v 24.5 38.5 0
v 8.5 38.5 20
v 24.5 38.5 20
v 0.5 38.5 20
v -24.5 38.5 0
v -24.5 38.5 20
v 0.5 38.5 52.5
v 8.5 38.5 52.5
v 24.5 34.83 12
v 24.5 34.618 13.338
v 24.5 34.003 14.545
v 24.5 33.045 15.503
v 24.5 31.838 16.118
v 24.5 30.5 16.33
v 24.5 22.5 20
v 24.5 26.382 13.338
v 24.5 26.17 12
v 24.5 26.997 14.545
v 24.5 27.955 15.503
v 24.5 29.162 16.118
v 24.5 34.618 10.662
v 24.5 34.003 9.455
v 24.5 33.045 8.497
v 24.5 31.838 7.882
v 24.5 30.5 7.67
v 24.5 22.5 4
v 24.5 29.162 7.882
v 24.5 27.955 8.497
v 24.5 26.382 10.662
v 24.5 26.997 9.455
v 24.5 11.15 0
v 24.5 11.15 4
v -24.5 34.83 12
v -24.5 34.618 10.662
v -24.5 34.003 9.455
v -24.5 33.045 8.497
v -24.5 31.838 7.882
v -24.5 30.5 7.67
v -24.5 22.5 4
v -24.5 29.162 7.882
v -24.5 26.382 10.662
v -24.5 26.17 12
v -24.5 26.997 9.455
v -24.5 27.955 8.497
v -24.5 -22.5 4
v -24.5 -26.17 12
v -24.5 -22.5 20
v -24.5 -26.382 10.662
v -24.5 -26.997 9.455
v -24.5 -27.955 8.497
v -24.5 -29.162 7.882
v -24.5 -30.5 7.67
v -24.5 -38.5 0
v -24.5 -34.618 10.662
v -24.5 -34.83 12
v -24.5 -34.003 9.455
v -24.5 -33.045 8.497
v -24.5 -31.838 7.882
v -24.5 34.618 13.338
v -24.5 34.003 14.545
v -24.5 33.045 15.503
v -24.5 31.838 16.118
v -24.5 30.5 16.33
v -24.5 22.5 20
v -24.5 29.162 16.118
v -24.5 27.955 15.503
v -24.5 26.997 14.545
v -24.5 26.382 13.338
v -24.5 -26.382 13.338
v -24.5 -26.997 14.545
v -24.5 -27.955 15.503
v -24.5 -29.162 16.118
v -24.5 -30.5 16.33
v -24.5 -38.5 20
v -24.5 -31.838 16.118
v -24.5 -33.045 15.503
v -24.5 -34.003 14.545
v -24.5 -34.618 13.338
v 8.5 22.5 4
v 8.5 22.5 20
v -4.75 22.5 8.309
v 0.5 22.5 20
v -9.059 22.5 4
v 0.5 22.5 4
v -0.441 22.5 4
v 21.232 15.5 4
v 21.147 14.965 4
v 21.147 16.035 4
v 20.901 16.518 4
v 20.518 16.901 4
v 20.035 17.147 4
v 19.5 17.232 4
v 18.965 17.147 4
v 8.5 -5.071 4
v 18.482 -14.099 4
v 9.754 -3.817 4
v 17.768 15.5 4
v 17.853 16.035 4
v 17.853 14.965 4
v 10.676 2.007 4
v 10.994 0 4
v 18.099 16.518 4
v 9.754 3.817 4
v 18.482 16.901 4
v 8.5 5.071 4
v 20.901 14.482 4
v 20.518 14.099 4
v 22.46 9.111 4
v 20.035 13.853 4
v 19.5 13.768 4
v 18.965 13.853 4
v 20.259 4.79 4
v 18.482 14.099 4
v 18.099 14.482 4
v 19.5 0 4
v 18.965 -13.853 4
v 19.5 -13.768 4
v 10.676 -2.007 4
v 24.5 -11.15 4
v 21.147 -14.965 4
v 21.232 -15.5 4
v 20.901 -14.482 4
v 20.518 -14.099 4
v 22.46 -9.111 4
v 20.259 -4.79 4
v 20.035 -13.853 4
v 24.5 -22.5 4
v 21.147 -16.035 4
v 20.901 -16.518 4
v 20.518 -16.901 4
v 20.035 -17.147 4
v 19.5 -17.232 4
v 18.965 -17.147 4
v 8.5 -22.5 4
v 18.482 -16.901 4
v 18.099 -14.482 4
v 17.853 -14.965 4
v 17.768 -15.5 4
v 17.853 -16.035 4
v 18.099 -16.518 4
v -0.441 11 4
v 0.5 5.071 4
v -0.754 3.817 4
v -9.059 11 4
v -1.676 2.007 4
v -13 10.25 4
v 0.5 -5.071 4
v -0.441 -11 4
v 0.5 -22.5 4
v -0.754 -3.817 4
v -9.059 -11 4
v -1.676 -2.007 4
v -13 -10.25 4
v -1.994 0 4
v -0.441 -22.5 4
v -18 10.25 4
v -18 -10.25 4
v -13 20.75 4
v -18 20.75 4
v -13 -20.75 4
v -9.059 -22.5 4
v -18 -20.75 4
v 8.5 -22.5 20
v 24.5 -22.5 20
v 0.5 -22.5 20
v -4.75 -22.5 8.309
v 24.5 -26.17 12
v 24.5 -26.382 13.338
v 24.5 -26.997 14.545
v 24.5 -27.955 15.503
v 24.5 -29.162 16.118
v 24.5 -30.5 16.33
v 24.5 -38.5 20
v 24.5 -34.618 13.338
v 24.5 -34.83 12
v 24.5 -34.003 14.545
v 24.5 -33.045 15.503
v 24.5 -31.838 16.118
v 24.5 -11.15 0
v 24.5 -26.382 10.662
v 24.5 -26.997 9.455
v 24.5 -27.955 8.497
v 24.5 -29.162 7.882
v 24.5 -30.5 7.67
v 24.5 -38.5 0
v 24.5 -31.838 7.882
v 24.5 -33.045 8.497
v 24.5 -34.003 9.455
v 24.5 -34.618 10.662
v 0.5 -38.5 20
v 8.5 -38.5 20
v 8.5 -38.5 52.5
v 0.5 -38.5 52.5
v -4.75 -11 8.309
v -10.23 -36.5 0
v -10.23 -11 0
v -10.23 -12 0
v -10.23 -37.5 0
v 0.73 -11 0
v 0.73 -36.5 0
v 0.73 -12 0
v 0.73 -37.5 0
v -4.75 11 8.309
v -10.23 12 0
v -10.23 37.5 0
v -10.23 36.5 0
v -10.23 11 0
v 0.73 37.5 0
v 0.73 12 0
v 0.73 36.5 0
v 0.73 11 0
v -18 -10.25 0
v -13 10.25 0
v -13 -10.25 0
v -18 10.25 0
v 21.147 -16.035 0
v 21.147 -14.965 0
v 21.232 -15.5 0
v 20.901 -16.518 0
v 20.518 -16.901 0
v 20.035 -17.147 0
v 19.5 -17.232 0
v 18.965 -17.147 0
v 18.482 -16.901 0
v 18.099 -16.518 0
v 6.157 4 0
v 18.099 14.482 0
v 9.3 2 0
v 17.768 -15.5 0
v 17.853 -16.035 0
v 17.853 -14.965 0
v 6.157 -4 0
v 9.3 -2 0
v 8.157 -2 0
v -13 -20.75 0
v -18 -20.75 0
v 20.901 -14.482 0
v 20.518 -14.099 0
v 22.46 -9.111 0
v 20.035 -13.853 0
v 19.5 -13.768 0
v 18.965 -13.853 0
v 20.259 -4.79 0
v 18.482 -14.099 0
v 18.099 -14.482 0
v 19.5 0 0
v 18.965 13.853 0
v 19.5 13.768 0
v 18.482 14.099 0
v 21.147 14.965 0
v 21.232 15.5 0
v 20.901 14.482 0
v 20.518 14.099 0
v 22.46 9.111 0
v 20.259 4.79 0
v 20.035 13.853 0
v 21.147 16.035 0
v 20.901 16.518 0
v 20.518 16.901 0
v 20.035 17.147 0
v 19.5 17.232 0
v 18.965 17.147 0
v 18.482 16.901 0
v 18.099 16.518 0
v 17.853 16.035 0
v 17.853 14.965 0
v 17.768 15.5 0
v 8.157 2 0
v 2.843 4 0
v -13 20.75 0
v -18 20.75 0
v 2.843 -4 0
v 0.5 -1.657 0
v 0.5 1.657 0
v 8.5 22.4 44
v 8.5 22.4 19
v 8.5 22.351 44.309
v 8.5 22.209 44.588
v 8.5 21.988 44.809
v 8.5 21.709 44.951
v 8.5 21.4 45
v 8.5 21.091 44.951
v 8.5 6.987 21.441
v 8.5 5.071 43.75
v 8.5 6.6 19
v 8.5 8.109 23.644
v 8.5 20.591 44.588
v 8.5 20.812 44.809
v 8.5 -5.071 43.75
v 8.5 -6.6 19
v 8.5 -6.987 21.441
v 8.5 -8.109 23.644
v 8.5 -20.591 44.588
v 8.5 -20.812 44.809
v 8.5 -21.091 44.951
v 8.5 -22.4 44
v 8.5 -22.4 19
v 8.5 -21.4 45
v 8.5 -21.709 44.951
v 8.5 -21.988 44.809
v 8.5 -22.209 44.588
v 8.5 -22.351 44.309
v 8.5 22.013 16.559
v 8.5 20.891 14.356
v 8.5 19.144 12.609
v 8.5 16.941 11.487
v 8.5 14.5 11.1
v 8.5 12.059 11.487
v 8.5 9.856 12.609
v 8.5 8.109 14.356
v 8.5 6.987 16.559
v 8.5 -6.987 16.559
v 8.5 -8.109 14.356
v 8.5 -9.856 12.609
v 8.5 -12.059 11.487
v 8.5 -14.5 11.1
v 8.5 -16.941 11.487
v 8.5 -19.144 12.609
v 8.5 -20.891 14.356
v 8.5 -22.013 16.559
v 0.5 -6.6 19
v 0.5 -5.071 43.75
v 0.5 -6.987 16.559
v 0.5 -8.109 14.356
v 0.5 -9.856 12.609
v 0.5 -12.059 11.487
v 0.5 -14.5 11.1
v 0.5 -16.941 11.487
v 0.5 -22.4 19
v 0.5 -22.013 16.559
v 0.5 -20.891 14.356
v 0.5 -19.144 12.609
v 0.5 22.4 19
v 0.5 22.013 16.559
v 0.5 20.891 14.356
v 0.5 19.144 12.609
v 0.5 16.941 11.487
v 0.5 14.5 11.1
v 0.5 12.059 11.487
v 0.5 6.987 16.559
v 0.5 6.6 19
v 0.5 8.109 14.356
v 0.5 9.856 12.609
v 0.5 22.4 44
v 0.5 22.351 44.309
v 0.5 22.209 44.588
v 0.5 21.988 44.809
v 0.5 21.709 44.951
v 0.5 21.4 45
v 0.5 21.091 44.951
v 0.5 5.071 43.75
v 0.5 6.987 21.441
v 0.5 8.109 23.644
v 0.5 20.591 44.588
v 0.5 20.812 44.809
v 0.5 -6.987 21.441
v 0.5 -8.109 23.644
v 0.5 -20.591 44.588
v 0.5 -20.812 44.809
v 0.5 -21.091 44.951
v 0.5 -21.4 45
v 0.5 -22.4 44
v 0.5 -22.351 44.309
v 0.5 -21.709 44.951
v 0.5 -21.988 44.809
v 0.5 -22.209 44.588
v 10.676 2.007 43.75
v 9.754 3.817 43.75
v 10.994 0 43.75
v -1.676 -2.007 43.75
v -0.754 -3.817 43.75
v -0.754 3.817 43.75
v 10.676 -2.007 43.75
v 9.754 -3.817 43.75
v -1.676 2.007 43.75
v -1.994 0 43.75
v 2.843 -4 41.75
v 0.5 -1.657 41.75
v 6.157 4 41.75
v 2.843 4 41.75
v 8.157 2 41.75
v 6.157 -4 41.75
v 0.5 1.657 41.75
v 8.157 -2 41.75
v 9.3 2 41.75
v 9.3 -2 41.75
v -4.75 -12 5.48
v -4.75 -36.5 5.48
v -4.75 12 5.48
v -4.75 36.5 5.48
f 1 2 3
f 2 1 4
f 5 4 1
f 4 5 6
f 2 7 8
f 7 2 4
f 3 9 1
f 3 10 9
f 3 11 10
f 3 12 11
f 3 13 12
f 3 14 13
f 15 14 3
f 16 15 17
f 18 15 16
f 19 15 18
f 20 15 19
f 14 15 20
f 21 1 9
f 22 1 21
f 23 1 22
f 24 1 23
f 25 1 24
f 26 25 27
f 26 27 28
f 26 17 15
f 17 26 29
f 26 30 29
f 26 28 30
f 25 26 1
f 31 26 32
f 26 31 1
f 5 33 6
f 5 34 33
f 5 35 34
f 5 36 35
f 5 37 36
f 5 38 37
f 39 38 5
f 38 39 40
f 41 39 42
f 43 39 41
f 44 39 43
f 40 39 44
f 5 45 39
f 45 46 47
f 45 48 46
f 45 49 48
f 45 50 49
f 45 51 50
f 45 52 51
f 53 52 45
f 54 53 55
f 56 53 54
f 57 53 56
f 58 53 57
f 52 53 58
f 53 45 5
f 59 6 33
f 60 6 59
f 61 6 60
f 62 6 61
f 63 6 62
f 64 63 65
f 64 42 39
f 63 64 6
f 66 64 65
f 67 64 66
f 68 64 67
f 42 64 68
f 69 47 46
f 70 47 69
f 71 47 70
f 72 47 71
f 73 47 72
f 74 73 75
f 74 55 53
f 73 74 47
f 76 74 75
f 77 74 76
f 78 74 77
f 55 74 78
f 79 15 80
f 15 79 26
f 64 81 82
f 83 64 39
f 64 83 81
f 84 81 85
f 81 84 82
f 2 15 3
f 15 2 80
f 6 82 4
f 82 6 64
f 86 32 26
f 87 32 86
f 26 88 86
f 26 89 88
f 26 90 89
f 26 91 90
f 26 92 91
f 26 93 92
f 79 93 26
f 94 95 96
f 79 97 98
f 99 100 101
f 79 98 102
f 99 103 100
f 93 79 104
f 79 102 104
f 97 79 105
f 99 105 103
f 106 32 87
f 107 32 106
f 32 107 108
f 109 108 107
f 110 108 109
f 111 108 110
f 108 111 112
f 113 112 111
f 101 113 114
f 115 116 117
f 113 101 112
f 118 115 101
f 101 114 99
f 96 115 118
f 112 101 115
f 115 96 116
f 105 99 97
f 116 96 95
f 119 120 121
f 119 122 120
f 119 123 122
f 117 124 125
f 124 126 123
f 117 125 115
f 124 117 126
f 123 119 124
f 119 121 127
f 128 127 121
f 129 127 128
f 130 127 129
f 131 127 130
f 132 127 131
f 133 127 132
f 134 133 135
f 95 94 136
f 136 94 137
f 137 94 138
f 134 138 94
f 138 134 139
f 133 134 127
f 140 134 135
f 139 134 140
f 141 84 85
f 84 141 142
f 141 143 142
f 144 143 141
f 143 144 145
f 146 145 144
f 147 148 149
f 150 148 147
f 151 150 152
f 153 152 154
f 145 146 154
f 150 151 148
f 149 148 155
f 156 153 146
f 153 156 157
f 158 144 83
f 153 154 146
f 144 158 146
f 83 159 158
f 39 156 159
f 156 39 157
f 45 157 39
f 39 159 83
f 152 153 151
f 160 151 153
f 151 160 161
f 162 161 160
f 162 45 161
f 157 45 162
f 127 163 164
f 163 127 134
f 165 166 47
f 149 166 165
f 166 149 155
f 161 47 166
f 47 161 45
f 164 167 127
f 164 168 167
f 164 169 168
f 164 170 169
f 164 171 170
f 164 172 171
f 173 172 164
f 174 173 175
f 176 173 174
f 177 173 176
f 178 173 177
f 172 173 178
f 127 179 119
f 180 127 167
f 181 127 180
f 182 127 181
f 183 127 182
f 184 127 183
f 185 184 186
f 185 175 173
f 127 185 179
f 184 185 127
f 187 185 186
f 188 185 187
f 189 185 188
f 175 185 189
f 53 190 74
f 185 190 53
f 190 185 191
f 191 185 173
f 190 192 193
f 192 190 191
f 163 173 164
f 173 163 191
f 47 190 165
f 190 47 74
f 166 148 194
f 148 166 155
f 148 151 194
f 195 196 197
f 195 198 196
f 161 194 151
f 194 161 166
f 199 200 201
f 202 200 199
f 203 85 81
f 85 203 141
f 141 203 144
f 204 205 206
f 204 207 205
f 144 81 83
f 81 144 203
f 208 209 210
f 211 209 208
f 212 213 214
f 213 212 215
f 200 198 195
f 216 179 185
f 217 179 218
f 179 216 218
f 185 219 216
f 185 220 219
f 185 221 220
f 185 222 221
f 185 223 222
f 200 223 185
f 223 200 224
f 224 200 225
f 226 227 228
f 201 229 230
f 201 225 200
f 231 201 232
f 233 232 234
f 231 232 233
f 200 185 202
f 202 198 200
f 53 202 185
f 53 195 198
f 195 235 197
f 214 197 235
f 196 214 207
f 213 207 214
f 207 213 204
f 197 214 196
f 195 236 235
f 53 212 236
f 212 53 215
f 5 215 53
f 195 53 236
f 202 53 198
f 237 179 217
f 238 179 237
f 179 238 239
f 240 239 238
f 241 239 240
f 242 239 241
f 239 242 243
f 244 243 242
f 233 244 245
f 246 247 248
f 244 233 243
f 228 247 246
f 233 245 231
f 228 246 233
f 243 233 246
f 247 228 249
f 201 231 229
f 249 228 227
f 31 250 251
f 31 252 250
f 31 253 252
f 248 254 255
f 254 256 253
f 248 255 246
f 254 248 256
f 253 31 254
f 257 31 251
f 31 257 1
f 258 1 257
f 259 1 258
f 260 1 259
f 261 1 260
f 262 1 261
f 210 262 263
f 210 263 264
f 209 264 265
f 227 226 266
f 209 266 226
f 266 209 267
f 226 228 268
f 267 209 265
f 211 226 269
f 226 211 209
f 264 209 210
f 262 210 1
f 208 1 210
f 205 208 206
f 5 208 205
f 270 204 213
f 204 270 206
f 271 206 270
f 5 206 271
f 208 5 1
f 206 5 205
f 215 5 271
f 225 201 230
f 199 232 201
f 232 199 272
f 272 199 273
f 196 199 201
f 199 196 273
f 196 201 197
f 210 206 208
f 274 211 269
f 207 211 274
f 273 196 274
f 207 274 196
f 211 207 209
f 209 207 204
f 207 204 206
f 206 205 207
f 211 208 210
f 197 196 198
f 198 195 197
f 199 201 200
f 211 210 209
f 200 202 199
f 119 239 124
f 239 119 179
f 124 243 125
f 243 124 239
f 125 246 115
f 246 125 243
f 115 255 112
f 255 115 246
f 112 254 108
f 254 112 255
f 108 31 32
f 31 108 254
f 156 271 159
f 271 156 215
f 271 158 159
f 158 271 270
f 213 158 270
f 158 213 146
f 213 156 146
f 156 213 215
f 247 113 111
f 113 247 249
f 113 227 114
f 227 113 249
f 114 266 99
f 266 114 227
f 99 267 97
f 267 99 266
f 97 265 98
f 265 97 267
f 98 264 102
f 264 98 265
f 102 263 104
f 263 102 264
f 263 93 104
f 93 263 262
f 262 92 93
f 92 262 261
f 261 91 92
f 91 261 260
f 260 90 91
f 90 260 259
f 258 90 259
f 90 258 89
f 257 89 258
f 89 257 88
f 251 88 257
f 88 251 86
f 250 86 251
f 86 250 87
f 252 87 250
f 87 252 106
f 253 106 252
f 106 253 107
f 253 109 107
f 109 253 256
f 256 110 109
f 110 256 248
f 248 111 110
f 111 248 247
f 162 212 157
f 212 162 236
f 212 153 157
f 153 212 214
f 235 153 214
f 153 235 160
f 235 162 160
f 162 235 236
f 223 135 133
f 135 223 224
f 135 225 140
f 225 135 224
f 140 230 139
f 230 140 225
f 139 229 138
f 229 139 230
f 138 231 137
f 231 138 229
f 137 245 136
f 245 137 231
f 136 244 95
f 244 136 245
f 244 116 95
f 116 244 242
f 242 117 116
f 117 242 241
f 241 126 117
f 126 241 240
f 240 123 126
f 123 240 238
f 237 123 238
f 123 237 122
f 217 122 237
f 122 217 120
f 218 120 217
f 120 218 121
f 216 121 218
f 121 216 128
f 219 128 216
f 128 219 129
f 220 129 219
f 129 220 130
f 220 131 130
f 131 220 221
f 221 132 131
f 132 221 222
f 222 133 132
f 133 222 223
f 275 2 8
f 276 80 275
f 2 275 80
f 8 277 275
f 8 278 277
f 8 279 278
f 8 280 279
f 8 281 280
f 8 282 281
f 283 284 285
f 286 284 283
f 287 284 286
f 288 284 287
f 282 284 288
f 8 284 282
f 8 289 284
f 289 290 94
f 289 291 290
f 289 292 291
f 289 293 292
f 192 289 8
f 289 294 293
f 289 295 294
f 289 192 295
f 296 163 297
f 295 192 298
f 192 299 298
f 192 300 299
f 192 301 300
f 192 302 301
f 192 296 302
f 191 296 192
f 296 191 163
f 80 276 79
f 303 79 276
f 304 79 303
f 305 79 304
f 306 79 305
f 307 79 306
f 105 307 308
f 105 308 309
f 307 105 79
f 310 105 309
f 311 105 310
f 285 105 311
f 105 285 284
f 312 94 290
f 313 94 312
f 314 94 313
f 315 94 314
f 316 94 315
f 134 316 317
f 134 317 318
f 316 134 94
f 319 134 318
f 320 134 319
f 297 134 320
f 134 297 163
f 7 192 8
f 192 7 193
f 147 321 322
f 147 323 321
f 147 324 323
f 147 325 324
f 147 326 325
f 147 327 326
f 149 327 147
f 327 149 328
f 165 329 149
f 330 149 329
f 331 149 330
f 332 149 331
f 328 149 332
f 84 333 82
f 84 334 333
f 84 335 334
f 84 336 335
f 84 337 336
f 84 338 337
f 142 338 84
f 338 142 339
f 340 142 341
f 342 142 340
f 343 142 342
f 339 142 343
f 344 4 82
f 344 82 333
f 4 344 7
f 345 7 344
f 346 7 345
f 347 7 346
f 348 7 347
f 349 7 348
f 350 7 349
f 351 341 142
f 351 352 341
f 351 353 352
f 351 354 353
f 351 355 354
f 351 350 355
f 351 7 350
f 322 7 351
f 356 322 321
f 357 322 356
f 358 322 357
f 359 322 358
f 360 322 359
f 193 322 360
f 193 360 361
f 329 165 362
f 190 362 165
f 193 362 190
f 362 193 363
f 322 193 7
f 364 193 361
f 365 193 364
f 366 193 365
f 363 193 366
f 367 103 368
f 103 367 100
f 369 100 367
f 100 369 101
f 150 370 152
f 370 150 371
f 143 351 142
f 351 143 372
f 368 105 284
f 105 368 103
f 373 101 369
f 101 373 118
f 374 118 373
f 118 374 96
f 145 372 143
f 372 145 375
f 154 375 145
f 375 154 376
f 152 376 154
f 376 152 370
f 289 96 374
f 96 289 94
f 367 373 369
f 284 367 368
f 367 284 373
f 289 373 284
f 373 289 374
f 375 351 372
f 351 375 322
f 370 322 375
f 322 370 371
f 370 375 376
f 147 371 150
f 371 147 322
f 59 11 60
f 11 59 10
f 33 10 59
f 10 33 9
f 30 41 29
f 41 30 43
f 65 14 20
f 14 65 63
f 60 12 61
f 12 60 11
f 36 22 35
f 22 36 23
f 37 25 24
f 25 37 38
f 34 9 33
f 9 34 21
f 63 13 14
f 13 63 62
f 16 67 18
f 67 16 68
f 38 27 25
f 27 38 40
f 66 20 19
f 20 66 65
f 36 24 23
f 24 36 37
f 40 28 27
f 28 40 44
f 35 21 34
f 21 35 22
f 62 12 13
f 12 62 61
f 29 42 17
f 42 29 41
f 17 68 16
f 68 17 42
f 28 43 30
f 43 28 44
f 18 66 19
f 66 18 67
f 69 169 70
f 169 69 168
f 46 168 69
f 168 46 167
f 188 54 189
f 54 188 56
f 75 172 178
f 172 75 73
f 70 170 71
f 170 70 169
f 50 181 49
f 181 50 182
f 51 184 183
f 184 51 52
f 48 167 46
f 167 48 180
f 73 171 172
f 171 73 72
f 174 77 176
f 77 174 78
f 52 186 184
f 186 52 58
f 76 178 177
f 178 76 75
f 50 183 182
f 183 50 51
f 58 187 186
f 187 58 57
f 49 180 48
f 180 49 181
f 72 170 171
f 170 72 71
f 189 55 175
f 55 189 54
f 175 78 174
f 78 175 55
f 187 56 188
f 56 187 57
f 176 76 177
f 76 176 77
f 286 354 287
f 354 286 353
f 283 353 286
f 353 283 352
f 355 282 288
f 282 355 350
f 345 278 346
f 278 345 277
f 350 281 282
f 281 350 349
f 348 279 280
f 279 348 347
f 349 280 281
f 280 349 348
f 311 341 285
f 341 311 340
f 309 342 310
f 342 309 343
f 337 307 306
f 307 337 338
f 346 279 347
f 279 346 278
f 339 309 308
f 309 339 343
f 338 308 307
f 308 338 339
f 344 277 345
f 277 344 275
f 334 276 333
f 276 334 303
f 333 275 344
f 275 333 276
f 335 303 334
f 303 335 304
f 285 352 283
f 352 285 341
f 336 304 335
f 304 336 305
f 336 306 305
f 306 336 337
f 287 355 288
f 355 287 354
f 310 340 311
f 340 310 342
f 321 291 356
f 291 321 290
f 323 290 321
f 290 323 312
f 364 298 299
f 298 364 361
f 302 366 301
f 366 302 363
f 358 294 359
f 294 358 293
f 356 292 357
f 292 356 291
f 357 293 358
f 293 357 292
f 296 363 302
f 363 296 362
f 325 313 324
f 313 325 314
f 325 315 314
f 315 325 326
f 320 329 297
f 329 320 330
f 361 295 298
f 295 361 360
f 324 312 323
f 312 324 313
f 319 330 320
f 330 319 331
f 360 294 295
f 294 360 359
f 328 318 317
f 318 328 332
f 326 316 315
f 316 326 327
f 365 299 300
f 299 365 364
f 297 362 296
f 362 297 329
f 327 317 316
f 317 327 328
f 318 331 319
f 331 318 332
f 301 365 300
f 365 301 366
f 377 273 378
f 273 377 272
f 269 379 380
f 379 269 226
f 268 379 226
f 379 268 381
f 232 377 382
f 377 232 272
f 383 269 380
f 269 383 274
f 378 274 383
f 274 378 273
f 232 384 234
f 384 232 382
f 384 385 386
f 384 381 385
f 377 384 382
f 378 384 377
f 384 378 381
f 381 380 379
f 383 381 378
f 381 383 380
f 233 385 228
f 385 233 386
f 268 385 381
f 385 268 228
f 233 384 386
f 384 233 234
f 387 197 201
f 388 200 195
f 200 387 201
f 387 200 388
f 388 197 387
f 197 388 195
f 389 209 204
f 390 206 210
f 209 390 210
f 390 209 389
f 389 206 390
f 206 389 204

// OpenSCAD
include <wallace2.scad>;

//base_end();

//translate([motor_casing+10,0,0]) 

base_end2();


module base_end2() difference() {

	// top plate & nema mount
	union(){
		linear_extrude(height = 4, convexity = 5) difference() {
			square([yz_motor_distance + motor_casing - motor_screw_spacing + 10, motor_casing + rod_size * 4], center = true);
			// nema motor arcs
			for(end = [1]) {
				for(side = [1,-1]) translate([end * (yz_motor_distance + motor_casing - motor_screw_spacing) / 2, side * motor_screw_spacing / 2, 0]) circle(m3_size * da6);
				translate([end * (yz_motor_distance + motor_casing) / 2, 0, 0]) #circle(motor_screw_spacing / 2);
			}
			// clamping holes for bearing retainer
			for(side = [1,-1]) translate([-1 * (yz_motor_distance + motor_casing - motor_screw_spacing) / 2+4, side * motor_screw_spacing / 2, 0]) square([4+1,10.5],center=true);

		}

		// X-rod retainers
		translate([0,0,rod_size/2]){
			for(side = [1, -1]) translate([0, side * 0.5 *(motor_casing + rod_size * 4), 0]) rotate([90, 0, 90]) {
				//translate([-rod_size*side,rod_size,0]) 
				//	cylinder(r = (motor_casing + rod_size * 4)/2 - (motor_casing / 2 + rod_size), h = yz_motor_distance + motor_casing - motor_screw_spacing + 10, center = true);
				// block coupling rod retainer to base plate
				translate([-rod_size*side,rod_size,]) 
					cube([rod_size*2,rod_size*2,yz_motor_distance + motor_casing - motor_screw_spacing + 10],center=true);
			}
		}

		// foot stand
		translate([yz_motor_distance / 2 - rod_size, 0, (end_height-motor_casing / 4)/2*1.2]) {
			cube([rod_size,motor_casing + rod_size * 4,(end_height-motor_casing / 4)*1.2],center=true);
		}

		// cylinder around Z-rods  	
		translate([yz_motor_distance / 2 - rod_size, 0, 0]) {
			cylinder(r=rod_size * da8 * 1.5, h=end_height-motor_casing / 4);
		}		


	// extra flesh around bottom of bearing retainers
	translate([-yz_motor_distance / 2 + bearing_size / 2, 0, -bearing_size * sqrt(2) / 4]) rotate([90, -45, 0]) {
		for(side = [0, 1]) mirror([0, 0, side]) translate([0, 0, rod_size / 2 + 8-1]) {
			difference(){
				cube([bearing_size / 2+2, bearing_size / 2+2, bearing_length+2]);
				cylinder(r = bearing_size / 2, h = bearing_length+2, center = false, $fn = 80);
			}
		}
	}



}
	
	// X-rod holes
	translate([0,0,rod_size/2]){
		for(side = [1, -1]) translate([0, side * 0.5 *(motor_casing + rod_size * 4), 0]) rotate([90, 0, 90]) {
			translate([-rod_size*side,rod_size,0])
				#cylinder(r = rod_size * da8, h = yz_motor_distance + motor_casing + 20, center = true);
		}
	}

	// foot holes
	translate([0,0,rod_size/2]){
		for(side = [1, -1]) translate([0, side * 0.5 *(motor_casing), 0]) rotate([90, 0, 90]) {
			translate([-rod_size*side,15,0]) {
				hull(){
				#cylinder(r = 7.9, h = yz_motor_distance + motor_casing + 20, center = true);
				translate([side*(7.9-1),25,0])#cylinder(r = 1, h = yz_motor_distance + motor_casing + 20, center = true);
				}
			}
		}
	}

	// Z-rod holes
	translate([yz_motor_distance / 2 - rod_size, 0, 0]) {
		translate([0, 0, -2])  {
			rotate(180 / 8) #cylinder(r=rod_size * da8, h=end_height-motor_casing / 4, $fn = 8);
			translate([0, -rod_size / 4, 0]) #cube([rod_size * .6, rod_size / 2,end_height-motor_casing / 4]);
		}

	}
	
	
	// bearing retainers
	translate([-yz_motor_distance / 2 + bearing_size / 2, 0, -bearing_size * sqrt(2) / 4]) rotate([90, -45, 0]) {
//		%cylinder(r = rod_size * da8, h = 100, center = true, $fn = 8);
		for(side = [0, 1]) mirror([0, 0, side]) translate([0, 0, rod_size / 2 + 8]) {
			cylinder(r = bearing_size / 2, h = bearing_length, center = false, $fn = 80);
			cube([bearing_size / 2, bearing_size / 2, bearing_length]);
		}
	}

}


module base_end() difference() {
	linear_extrude(height = end_height, convexity = 5) difference() {
		square([yz_motor_distance + motor_casing - motor_screw_spacing + 10, motor_casing + rod_size * 4], center = true);
		// nema motor arcs
		for(end = [1, -1]) {
			for(side = [1, -1]) translate([end * (yz_motor_distance + motor_casing - motor_screw_spacing) / 2, side * motor_screw_spacing / 2, 0]) circle(m3_size * da6, $fn = 6);
			translate([end * (yz_motor_distance + motor_casing) / 2, 0, 0]) #circle(motor_screw_spacing / 2);
		}
	}
	for(end = [1, -1]) translate([end * (yz_motor_distance + motor_casing) / 2, 0, 3]) linear_extrude(height = end_height, convexity = 5) square(motor_casing, center = true);
	for(side = [1, -1]) translate([0, side * (motor_casing / 2 + rod_size), rod_size / 2 + bearing_size / 2]) rotate([90, 180 / 8, 90]) {
		cylinder(r = rod_size * da8, h = yz_motor_distance + motor_casing + 20, center = true, $fn = 8);
		%translate([0, 0, -70]) cylinder(r = rod_size * da8, h = 200, center = true, $fn = 8);
	}
	translate([0, 0, end_height]) scale([1, 1, .5]) rotate([90, 0, 90]) cylinder(r = motor_casing / 2, h = yz_motor_distance + 20, center = true);
	translate([yz_motor_distance / 2 - rod_size, 0, 0]) {
		translate([0, 0, -3]) linear_extrude(height = end_height - motor_casing / 4, convexity = 5) {
			rotate(180 / 8) circle(rod_size * da8, $fn = 8);
			translate([0, -rod_size / 4, 0]) square([rod_size * .6, rod_size / 2]);
		}

	}
	translate([-yz_motor_distance / 2 + bearing_size / 2, 0, -bearing_size * sqrt(2) / 4]) rotate([90, -45, 0]) {
		%cylinder(r = rod_size * da8, h = 100, center = true, $fn = 8);
		for(side = [0, 1]) mirror([0, 0, side]) translate([0, 0, rod_size / 2 + 8]) {
			cylinder(r = bearing_size / 2, h = bearing_length, center = false, $fn = 80);
			cube([bearing_size / 2, bearing_size / 2, bearing_length]);
		}
	}
	translate([0, 0, end_height - rod_size * 1.5]) rotate([90, 180 / 8, 0]) cylinder(r = rod_size * da8, h = motor_casing + rod_size * 5, $fn = 8, center = true);
	%translate([0, 0, end_height - rod_size * 1.5]) rotate([90, 180 / 8, 0]) cylinder(r = rod_size * da8, h = 100, $fn = 8, center = true);

}
